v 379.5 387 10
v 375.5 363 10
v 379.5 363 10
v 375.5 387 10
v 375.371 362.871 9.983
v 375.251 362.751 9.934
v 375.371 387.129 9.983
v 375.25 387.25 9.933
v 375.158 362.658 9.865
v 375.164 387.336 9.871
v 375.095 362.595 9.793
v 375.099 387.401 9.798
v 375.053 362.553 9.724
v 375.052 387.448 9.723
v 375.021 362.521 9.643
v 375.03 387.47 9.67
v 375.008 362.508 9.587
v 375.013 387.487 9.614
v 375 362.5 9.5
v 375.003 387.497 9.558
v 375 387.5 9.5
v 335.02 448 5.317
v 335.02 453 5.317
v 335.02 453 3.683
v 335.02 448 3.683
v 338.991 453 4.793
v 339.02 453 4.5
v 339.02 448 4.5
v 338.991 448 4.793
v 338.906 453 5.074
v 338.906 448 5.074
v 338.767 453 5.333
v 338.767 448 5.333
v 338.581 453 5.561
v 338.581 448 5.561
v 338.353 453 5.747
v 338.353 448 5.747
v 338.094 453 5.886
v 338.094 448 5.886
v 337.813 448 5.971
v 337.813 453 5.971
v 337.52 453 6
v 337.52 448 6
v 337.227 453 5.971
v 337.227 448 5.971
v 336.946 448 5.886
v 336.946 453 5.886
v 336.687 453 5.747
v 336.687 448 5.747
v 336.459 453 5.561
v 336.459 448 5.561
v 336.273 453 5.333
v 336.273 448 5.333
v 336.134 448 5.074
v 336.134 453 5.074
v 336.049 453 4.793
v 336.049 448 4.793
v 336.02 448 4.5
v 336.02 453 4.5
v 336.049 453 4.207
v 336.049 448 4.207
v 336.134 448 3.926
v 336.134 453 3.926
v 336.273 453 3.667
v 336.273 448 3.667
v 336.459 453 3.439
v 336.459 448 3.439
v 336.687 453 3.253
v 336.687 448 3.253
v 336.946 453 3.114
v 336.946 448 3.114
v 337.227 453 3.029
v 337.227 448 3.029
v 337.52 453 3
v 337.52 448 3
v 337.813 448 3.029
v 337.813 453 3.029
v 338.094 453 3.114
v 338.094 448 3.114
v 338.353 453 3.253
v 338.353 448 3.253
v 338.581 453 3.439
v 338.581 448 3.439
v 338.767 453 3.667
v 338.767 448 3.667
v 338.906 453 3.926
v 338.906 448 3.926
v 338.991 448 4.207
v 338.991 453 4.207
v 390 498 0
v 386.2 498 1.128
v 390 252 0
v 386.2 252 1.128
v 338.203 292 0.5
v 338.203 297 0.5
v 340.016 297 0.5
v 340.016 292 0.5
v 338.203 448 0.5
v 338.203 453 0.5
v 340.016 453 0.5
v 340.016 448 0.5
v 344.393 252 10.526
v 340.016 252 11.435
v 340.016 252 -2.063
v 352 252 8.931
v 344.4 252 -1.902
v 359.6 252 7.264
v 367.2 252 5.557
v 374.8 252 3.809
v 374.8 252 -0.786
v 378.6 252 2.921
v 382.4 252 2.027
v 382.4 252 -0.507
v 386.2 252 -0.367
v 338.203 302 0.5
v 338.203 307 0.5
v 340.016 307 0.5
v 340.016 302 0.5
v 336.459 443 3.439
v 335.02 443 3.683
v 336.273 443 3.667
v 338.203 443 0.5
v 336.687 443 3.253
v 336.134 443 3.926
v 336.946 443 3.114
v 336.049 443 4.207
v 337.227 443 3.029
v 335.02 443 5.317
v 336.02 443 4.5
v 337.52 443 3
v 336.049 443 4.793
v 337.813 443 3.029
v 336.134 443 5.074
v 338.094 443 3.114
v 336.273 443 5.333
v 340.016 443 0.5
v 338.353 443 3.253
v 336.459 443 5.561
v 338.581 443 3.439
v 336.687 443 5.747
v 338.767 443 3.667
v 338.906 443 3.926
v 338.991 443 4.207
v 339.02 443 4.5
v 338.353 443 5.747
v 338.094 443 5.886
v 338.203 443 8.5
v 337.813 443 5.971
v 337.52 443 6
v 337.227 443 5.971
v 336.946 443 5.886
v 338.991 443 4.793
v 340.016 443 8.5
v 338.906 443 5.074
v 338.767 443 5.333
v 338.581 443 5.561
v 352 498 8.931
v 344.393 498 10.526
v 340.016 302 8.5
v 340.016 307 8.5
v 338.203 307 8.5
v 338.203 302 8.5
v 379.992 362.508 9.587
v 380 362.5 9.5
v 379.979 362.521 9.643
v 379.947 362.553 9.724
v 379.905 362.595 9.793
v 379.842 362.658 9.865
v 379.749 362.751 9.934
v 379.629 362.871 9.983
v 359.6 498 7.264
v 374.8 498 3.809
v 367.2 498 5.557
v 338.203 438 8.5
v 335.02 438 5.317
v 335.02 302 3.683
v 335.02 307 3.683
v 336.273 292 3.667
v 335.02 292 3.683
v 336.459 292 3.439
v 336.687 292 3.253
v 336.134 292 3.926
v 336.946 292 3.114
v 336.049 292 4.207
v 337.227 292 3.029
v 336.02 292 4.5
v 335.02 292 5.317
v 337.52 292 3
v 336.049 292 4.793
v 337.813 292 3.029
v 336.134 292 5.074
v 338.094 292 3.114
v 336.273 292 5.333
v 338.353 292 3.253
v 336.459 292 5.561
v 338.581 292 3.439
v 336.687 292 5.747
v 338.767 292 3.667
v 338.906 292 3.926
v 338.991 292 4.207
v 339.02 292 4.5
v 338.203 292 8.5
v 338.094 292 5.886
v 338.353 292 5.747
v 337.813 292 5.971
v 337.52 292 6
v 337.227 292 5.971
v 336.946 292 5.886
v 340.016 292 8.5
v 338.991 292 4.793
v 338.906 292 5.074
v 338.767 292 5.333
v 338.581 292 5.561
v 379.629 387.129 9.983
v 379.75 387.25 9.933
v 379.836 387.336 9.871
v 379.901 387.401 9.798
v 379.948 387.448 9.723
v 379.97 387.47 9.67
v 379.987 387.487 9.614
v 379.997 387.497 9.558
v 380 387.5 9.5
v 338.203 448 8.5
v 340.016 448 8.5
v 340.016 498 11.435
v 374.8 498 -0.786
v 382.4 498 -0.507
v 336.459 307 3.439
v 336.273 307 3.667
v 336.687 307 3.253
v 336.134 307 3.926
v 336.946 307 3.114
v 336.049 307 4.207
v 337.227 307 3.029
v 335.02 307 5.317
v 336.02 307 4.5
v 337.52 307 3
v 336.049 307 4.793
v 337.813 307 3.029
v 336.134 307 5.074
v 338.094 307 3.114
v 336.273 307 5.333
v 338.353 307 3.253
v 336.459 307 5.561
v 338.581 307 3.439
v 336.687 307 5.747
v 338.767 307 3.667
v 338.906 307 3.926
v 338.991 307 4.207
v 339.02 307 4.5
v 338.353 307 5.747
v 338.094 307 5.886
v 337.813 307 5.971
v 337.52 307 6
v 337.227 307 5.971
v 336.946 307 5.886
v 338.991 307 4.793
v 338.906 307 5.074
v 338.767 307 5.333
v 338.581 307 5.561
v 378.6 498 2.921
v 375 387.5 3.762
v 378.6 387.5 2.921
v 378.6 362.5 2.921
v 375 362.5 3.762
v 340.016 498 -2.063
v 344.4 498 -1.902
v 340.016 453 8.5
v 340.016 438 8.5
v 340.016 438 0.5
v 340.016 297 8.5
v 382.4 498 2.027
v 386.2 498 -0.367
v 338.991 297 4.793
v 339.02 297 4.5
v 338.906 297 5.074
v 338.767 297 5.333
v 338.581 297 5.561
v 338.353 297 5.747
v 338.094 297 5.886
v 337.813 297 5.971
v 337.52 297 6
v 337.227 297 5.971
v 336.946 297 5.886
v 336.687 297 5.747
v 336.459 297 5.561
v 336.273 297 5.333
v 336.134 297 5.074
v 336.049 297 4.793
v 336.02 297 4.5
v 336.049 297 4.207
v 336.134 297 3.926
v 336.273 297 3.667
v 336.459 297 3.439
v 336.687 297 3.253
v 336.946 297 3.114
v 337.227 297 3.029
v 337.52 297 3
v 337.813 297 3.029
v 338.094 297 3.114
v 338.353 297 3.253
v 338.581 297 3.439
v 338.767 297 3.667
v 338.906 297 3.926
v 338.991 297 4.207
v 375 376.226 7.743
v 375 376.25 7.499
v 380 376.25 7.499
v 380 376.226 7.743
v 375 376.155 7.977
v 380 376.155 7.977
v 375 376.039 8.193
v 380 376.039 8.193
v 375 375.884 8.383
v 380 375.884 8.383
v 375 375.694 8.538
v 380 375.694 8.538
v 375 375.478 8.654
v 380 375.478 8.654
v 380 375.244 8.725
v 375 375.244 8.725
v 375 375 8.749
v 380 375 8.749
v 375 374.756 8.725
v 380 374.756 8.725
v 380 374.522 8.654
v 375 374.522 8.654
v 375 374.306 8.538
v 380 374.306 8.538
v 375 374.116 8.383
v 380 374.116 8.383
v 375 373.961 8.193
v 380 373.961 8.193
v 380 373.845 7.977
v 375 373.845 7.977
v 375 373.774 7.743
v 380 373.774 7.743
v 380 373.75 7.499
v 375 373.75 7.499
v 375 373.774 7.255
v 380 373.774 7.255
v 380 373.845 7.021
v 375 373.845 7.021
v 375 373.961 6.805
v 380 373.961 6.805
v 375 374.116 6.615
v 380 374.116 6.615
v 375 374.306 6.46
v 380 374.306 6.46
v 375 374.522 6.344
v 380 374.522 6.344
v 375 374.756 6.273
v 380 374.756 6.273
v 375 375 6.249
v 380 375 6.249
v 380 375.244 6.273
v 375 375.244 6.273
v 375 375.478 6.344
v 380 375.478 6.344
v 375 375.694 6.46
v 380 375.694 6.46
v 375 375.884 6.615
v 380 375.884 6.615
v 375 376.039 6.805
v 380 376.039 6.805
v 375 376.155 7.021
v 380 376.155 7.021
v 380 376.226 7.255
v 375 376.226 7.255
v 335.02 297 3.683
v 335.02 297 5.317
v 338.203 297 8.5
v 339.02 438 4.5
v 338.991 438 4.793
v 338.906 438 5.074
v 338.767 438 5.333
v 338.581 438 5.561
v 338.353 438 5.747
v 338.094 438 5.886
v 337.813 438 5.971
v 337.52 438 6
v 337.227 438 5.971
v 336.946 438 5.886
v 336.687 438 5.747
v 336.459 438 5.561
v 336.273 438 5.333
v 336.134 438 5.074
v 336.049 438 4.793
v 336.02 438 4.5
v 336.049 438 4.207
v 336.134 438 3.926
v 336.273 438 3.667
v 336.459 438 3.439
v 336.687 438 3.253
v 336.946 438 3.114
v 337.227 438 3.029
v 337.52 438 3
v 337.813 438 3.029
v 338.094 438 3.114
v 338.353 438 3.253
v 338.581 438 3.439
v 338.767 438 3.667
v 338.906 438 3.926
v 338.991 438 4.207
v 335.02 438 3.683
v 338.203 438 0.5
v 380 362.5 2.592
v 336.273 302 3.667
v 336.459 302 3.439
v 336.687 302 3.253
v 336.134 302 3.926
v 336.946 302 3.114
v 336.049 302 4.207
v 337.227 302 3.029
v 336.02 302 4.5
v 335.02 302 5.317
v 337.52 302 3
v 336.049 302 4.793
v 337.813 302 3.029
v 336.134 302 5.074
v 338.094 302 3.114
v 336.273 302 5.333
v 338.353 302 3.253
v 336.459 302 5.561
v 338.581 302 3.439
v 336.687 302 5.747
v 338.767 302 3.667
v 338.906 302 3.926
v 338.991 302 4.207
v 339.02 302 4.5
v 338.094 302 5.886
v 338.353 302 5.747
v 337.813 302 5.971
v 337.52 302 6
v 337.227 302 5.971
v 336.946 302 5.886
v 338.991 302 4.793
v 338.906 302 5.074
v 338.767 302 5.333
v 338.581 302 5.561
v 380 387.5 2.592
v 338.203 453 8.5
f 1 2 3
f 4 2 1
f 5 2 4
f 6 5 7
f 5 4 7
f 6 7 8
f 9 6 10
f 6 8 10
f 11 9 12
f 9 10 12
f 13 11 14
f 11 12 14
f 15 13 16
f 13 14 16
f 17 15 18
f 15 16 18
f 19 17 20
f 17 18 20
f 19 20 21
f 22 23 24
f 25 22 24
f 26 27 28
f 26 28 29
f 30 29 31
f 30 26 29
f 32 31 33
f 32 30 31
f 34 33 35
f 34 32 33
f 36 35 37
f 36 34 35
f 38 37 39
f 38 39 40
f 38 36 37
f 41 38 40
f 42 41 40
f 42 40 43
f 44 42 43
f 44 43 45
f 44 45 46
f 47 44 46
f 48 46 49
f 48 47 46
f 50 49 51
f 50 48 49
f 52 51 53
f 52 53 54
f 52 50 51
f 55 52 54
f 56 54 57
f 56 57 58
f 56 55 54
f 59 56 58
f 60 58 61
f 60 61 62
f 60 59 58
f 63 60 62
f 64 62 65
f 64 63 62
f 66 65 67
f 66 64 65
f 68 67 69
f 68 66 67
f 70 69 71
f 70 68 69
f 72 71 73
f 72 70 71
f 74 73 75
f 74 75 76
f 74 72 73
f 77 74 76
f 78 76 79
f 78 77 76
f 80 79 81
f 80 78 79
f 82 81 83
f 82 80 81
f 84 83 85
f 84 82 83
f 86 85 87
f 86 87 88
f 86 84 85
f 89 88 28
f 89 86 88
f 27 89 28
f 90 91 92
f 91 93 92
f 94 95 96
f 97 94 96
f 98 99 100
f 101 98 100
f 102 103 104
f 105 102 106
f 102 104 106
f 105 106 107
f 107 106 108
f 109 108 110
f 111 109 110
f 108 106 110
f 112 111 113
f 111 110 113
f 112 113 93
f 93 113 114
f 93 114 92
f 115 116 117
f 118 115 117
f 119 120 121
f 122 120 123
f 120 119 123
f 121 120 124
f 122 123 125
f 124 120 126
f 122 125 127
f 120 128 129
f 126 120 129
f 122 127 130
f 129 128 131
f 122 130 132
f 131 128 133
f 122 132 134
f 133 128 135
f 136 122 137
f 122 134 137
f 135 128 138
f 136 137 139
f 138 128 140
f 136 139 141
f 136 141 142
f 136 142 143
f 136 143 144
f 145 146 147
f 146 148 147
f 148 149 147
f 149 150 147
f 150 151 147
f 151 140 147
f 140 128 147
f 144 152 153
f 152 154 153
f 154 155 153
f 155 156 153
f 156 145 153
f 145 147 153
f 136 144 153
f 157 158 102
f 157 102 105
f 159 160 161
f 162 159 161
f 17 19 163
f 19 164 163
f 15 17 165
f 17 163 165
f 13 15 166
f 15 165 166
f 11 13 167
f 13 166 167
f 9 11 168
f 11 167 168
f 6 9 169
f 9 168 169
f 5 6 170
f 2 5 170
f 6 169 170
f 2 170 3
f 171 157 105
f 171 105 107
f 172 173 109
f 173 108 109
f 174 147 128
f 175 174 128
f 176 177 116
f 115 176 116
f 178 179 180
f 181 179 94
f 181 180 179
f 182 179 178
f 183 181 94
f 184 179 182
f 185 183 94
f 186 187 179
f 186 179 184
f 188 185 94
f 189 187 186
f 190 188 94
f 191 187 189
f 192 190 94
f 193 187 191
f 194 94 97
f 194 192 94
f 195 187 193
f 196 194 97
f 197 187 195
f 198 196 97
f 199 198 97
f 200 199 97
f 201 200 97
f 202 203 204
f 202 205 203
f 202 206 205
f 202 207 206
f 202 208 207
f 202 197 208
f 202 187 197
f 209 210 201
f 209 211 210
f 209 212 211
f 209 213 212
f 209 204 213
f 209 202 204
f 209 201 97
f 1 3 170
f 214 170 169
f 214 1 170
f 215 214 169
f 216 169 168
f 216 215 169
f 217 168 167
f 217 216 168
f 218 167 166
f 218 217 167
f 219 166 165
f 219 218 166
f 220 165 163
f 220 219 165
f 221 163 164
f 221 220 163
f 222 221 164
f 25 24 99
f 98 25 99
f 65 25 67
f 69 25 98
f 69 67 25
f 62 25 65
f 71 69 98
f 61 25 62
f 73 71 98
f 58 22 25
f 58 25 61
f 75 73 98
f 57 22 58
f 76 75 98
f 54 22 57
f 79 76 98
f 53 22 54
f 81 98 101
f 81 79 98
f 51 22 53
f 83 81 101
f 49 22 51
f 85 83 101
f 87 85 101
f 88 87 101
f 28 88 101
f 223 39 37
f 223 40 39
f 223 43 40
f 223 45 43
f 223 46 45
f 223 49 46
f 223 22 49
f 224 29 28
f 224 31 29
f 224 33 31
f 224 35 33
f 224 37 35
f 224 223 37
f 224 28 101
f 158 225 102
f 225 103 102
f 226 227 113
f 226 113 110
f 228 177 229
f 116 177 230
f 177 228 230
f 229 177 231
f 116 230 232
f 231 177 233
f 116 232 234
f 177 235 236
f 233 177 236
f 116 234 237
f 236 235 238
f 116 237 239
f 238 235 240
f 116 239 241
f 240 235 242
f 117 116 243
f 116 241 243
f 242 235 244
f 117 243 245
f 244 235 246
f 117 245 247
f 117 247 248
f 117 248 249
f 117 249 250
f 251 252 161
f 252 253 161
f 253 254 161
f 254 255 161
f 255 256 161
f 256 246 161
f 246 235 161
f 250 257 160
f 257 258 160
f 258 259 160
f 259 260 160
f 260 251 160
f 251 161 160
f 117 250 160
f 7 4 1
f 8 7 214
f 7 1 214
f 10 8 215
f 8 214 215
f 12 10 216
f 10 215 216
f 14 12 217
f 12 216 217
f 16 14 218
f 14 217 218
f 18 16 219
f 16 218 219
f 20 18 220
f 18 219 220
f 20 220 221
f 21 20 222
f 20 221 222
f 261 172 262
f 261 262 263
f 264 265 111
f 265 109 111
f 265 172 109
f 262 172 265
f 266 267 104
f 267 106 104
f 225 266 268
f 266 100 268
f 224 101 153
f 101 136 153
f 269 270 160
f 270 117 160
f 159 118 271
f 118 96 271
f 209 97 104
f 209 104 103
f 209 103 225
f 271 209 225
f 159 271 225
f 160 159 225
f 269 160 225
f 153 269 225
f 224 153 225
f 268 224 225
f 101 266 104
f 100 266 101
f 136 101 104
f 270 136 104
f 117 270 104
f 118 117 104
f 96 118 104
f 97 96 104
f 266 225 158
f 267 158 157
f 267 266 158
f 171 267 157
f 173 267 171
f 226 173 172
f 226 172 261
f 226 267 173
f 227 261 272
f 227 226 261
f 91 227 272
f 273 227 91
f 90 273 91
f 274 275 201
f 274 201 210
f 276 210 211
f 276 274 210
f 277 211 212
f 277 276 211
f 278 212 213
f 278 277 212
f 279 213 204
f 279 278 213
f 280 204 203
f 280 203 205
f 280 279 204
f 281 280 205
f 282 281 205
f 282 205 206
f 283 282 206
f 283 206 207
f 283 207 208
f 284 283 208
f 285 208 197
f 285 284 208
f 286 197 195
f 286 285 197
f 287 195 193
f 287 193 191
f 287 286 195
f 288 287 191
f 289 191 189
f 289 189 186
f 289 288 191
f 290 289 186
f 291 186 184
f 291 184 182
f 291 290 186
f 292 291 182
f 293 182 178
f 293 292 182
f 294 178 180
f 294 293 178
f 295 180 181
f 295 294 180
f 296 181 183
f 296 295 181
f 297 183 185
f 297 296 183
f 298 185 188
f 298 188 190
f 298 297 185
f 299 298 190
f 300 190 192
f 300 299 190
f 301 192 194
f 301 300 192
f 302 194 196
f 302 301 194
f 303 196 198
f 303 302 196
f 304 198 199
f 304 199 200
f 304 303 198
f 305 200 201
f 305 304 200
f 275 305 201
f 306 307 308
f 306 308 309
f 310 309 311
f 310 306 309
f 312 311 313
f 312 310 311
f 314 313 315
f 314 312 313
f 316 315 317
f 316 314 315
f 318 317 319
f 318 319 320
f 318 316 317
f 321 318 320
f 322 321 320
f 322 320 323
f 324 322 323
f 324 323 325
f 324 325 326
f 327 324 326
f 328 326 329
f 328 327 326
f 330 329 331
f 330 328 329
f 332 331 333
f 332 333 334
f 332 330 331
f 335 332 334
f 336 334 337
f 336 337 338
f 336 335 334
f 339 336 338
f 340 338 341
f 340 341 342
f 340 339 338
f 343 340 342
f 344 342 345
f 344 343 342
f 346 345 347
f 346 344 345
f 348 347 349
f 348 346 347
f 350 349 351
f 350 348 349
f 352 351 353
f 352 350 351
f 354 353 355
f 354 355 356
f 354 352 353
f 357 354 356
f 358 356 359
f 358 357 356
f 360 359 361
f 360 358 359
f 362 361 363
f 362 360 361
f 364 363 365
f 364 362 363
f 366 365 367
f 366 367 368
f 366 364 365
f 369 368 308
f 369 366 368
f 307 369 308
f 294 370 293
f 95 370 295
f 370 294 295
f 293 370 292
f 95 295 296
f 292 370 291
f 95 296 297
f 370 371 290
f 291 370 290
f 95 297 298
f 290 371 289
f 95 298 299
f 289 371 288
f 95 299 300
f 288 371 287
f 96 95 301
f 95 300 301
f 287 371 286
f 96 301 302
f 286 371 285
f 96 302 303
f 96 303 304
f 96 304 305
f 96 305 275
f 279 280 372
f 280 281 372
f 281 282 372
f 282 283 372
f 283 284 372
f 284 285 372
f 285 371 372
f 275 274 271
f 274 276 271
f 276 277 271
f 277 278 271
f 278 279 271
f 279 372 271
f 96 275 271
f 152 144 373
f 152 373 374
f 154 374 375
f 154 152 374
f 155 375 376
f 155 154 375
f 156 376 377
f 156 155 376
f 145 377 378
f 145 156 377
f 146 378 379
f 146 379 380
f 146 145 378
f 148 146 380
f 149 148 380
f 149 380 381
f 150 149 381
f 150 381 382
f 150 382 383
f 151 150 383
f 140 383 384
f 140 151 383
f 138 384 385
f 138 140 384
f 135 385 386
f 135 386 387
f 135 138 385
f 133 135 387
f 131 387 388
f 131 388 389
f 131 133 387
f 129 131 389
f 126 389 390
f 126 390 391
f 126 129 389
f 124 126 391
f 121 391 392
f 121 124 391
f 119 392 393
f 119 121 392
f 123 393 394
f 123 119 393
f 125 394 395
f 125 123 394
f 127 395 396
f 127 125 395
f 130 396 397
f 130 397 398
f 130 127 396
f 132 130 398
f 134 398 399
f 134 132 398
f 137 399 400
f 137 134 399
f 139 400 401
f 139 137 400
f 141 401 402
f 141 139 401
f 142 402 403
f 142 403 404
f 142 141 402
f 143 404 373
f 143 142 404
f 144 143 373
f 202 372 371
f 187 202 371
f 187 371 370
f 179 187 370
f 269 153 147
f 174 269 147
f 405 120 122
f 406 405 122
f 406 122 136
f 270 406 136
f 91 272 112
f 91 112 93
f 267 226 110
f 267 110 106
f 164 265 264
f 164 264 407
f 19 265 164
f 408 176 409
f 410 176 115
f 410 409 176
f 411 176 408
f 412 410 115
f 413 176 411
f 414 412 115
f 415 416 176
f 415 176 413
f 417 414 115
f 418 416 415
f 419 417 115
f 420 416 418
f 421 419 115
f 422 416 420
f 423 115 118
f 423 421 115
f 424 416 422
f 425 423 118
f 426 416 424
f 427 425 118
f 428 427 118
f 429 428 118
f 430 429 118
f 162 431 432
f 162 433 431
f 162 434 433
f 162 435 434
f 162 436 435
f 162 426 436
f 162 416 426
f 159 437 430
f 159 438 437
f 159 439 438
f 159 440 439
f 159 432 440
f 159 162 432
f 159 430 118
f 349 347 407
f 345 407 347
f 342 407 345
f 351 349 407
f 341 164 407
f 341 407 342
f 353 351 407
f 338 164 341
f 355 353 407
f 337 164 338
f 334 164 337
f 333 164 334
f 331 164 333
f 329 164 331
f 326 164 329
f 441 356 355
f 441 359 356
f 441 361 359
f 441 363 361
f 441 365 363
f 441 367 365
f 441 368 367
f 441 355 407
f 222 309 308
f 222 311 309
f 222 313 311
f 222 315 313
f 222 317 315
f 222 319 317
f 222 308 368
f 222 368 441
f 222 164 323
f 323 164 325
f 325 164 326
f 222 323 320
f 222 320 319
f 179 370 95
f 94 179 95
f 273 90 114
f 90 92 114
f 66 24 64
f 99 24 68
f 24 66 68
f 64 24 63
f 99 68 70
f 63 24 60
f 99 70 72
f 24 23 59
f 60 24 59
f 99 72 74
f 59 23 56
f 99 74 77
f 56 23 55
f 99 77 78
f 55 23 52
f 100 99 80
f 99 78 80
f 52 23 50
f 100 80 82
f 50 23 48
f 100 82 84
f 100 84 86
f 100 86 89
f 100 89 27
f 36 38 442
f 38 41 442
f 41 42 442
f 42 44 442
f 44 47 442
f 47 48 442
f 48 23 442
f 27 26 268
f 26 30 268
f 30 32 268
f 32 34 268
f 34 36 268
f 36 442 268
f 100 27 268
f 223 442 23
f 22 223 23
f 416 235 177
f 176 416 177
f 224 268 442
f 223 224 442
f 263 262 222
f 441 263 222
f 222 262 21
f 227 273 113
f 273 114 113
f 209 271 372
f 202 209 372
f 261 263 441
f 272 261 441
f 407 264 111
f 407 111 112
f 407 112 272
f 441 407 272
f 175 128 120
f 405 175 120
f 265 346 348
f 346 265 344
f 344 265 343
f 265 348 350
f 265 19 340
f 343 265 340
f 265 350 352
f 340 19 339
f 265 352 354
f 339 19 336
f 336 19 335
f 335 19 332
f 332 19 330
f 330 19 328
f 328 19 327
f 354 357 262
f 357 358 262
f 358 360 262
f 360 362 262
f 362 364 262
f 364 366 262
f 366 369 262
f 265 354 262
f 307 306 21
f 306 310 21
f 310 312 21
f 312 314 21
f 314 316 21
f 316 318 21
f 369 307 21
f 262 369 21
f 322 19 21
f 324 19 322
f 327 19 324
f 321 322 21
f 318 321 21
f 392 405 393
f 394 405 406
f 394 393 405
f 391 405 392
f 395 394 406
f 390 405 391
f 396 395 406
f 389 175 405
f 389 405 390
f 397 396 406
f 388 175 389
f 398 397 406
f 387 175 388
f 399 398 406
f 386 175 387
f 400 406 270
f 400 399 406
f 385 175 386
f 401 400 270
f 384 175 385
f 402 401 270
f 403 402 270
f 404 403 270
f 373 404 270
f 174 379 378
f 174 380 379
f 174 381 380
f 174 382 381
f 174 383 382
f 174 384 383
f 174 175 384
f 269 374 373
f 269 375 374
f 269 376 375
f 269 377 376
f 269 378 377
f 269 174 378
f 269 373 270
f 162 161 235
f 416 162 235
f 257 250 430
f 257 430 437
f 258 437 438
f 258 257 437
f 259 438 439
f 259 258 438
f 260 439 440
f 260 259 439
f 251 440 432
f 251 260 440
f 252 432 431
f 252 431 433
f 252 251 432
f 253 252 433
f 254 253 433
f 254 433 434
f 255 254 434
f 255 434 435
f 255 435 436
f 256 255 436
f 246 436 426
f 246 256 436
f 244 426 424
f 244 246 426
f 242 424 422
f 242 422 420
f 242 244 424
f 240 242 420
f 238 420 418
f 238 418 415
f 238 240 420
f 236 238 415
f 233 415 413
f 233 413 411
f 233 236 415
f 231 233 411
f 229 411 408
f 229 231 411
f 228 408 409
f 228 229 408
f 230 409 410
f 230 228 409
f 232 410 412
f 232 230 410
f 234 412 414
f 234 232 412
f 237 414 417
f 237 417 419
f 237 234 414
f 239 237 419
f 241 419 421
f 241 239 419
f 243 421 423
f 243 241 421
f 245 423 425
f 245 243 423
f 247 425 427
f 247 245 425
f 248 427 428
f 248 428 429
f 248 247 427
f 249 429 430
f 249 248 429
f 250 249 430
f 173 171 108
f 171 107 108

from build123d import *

# Parameters (mm, degrees)
SKETCH020_R  = 1.5
PAD005_DEPTH = 5
SKETCH021_R  = 1.5
PAD007_DEPTH = 5
SKETCH018_R  = 1.5
PAD004_DEPTH = 5
SKETCH017_R  = 1.5
PAD008_DEPTH = 5
SKETCH025_W  = 25
SKETCH025_H  = 10
SKETCH025_R  = 1.25
PAD014_DEPTH = 5
FILLET_R     = 0.5


with BuildPart() as body012:
    # Sketch020 → Pad005 (new body)
    with BuildSketch(Plane(origin=(0.02, 0, 0), x_dir=(1, 0, 0), z_dir=(0, -1, 0))):
        Polygon((0.683099, -4), (2.5, -4), (2.5, 4), (0.683099, 4), (-2.5, 0.816901), (-2.5, -0.816901), align=None)
        Circle(SKETCH020_R, mode=Mode.SUBTRACT)
    extrude(amount=PAD005_DEPTH)


with BuildPart() as body012_1:
    # Body012 placement: moved
    add(body012.part.moved(Location((337.5, 453, 4.5))))


with BuildPart() as body013:
    # Sketch021 → Pad007 (new body)
    with BuildSketch(Plane(origin=(0.02, 0, 0), x_dir=(1, 0, 0), z_dir=(0, -1, 0))):
        Polygon((0.683099, -4), (2.5, -4), (2.5, 4), (0.683099, 4), (-2.5, 0.816901), (-2.5, -0.816901), align=None)
        Circle(SKETCH021_R, mode=Mode.SUBTRACT)
    extrude(amount=PAD007_DEPTH)


with BuildPart() as body013_1:
    # Body013 placement: moved
    add(body013.part.moved(Location((337.5, 443, 4.5))))


with BuildPart() as body010:
    # Sketch018 → Pad004 (new body)
    with BuildSketch(Plane(origin=(0.02, 0, 0), x_dir=(1, 0, 0), z_dir=(0, -1, 0))):
        Polygon((0.683099, -4), (2.5, -4), (2.5, 4), (0.683099, 4), (-2.5, 0.816901), (-2.5, -0.816901), align=None)
        Circle(SKETCH018_R, mode=Mode.SUBTRACT)
    extrude(amount=PAD004_DEPTH)


with BuildPart() as body010_1:
    # Body010 placement: moved
    add(body010.part.moved(Location((337.5, 297, 4.5))))


with BuildPart() as body009:
    # Sketch017 → Pad008 (new body)
    with BuildSketch(Plane(origin=(0.02, 0, 0), x_dir=(1, 0, 0), z_dir=(0, -1, 0))):
        Polygon((0.683099, -4), (2.5, -4), (2.5, 4), (0.683099, 4), (-2.5, 0.816901), (-2.5, -0.816901), align=None)
        Circle(SKETCH017_R, mode=Mode.SUBTRACT)
    extrude(amount=PAD008_DEPTH)


with BuildPart() as body009_1:
    # Body009 placement: moved
    add(body009.part.moved(Location((337.5, 307, 4.5))))


with BuildPart() as hinge_aileron:
    # Sketch025 → Pad014 (new body)
    with BuildSketch(Plane.YZ):
        Rectangle(SKETCH025_W, SKETCH025_H)
        with Locations((0, 2.498994)):
            Circle(SKETCH025_R, mode=Mode.SUBTRACT)
    extrude(amount=PAD014_DEPTH)

    # Fillet
    fillet_edges = [hinge_aileron.edges().sort_by_distance(p)[0] for p in [
        (2.5, 12.5, 5),
        (2.5, -12.5, 5),
        (0, 0, 5),
        (5, 0, 5),
    ]]
    fillet(fillet_edges, radius=FILLET_R)


with BuildPart() as hinge_aileron_1:
    # Body017 placement: moved
    add(hinge_aileron.part.moved(Location((375, 375, 5))))


with BuildPart() as aileron:
    # Sketch012 → AdditiveLoft001 section 0
    with BuildSketch(Plane(origin=(10, 498, 0), x_dir=(1, 0, 0), z_dir=(0, -1, 0))):
        Polygon((334.392927, 10.526054), (342, 8.93095), (349.6, 7.263928), (357.2, 5.557082), (364.8, 3.808816), (368.6, 2.920984), (372.4, 2.02673), (376.2, 1.12822), (380, 0), (376.2, -0.367308), (372.4, -0.506882), (368.6, -0.646418), (364.8, -0.785954), (357.2, -1.065064), (349.6, -1.344174), (342, -1.623284), (334.4, -1.902394), (330.0157, -2.063407), (330.0157, 11.43475), align=None)
    # Sketch014 → AdditiveLoft001 section 1
    with BuildSketch(Plane(origin=(10, 252, 0), x_dir=(1, 0, 0), z_dir=(0, -1, 0))):
        Polygon((334.392927, 10.526054), (342, 8.93095), (349.6, 7.263928), (357.2, 5.557082), (364.8, 3.808816), (368.6, 2.920984), (372.4, 2.02673), (376.2, 1.12822), (380, 0), (376.2, -0.367308), (372.4, -0.506882), (368.6, -0.646418), (364.8, -0.785954), (357.2, -1.065064), (349.6, -1.344174), (342, -1.623284), (334.4, -1.902394), (330.0157, -2.063407), (330.0157, 11.43475), align=None)
    loft()

    # Boolean002: union Body012, Body013, Body010, Body009
    add(body012_1.part)
    add(body013_1.part)
    add(body010_1.part)
    add(body009_1.part)

    # Boolean004: union hinge_aileron
    add(hinge_aileron_1.part)


solid = aileron.part
